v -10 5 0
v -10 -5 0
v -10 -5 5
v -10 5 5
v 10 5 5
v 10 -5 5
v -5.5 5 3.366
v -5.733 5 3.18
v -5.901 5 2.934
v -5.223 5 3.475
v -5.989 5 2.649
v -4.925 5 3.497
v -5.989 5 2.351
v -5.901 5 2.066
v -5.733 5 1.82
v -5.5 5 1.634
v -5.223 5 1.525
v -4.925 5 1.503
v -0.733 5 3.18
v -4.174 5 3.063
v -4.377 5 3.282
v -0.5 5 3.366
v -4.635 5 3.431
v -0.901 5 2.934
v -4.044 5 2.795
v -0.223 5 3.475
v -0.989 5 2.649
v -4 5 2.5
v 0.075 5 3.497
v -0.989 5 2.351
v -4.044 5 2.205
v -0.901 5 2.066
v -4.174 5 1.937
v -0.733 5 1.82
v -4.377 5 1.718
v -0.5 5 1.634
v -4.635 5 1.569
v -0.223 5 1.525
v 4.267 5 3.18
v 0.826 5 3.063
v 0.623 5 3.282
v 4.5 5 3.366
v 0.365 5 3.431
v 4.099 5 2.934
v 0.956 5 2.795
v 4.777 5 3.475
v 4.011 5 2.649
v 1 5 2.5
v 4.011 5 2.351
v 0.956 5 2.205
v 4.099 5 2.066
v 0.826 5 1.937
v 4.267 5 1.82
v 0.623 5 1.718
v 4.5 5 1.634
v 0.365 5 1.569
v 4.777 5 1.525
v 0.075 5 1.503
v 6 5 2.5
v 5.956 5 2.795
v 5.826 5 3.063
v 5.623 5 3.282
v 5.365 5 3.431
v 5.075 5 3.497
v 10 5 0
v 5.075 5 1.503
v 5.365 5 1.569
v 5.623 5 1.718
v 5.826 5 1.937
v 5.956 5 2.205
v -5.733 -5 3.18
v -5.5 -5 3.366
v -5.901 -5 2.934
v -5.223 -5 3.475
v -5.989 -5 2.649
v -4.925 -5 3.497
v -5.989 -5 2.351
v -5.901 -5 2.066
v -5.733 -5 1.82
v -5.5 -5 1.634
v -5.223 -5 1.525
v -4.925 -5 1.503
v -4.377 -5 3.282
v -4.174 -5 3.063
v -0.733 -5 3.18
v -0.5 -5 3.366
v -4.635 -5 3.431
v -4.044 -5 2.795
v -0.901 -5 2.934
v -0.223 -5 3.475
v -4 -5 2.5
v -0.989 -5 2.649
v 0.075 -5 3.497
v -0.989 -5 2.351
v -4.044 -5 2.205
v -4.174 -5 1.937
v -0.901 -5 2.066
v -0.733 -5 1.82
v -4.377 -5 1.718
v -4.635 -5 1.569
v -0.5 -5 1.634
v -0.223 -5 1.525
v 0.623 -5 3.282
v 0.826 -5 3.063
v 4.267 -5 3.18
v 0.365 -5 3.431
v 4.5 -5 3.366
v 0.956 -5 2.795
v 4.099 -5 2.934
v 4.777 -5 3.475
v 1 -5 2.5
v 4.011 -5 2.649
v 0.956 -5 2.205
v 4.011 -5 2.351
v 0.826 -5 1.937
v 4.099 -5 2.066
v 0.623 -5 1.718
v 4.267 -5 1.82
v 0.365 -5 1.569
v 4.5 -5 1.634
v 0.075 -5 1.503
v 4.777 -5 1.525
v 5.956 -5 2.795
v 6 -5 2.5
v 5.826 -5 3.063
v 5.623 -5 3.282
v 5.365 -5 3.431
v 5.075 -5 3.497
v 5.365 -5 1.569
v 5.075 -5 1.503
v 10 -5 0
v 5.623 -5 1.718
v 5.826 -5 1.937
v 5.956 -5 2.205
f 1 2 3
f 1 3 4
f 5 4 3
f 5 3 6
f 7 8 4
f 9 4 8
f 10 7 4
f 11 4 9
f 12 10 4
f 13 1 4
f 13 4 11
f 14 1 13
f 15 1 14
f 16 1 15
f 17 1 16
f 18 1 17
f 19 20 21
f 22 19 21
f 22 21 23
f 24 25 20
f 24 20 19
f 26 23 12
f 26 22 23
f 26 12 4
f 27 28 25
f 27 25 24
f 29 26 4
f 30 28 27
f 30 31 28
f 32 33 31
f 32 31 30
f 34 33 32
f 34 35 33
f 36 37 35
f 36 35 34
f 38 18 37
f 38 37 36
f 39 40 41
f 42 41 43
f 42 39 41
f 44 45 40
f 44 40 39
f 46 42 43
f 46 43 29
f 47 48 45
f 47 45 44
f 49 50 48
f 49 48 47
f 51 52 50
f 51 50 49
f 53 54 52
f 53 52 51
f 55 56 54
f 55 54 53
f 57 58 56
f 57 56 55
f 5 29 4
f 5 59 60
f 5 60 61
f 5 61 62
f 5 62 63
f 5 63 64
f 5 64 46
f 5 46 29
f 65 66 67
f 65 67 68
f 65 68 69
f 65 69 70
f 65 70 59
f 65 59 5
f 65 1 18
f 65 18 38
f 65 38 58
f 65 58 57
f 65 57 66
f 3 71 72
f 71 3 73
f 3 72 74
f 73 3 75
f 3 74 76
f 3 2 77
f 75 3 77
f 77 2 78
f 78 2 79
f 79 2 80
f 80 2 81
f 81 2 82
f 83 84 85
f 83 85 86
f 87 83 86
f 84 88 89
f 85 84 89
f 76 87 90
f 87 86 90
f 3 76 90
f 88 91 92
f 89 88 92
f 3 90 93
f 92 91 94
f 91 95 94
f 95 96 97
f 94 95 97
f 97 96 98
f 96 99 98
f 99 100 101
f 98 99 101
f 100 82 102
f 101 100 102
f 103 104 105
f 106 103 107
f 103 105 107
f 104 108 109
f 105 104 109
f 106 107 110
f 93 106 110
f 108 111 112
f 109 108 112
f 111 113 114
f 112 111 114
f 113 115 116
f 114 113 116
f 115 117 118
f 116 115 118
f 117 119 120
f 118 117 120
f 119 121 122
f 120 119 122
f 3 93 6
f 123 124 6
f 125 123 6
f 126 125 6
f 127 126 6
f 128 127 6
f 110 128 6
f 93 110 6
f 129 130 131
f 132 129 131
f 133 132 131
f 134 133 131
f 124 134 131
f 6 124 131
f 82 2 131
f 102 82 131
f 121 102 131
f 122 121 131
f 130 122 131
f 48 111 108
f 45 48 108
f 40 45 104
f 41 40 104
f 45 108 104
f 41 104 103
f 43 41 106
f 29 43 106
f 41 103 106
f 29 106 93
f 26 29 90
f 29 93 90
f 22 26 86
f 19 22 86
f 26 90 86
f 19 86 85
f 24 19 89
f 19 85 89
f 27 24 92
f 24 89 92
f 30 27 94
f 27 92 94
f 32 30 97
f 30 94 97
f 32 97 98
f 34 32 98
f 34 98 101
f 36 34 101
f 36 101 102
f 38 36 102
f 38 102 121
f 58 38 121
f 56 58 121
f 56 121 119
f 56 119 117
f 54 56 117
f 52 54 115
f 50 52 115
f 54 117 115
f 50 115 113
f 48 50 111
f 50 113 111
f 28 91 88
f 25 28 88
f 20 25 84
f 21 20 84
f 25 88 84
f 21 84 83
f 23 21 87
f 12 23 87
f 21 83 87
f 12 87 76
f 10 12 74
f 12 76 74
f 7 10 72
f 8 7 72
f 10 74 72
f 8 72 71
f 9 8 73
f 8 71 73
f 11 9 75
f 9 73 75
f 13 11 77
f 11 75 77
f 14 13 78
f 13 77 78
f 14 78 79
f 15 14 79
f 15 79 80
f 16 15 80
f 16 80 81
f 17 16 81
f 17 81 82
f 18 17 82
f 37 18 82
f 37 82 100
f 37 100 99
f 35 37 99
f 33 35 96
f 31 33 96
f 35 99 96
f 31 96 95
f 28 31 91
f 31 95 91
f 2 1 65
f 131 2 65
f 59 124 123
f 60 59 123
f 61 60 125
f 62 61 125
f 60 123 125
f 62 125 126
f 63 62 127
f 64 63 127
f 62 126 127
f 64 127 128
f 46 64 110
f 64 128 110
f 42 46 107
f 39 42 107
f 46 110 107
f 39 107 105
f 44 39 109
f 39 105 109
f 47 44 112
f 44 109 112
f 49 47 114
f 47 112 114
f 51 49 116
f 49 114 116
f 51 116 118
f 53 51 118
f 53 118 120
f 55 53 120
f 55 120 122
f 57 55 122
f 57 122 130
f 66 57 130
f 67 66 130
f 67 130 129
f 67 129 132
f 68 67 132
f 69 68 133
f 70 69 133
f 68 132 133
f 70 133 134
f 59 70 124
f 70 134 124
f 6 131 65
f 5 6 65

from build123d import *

# Parameters (mm, degrees)
F0_W     = 20
F0_H     = 10
F1_DEPTH = 5
F2_R     = 1
F3_DEPTH = 10


with BuildPart() as f1:
    # F0 (on Top) → F1 (new body)
    with BuildSketch(Plane.XY):
        Rectangle(F0_W, F0_H)
    extrude(amount=F1_DEPTH)

    # F2 (on face) → F3 (cut, through all)
    with BuildSketch(Plane.XZ.offset(5)):
        with Locations((-5, 2.5)):
            Circle(F2_R)
        with Locations((0, 2.5)):
            Circle(F2_R)
        with Locations((5, 2.5)):
            Circle(F2_R)
    extrude(amount=-F3_DEPTH, mode=Mode.SUBTRACT)


solid = f1.part
